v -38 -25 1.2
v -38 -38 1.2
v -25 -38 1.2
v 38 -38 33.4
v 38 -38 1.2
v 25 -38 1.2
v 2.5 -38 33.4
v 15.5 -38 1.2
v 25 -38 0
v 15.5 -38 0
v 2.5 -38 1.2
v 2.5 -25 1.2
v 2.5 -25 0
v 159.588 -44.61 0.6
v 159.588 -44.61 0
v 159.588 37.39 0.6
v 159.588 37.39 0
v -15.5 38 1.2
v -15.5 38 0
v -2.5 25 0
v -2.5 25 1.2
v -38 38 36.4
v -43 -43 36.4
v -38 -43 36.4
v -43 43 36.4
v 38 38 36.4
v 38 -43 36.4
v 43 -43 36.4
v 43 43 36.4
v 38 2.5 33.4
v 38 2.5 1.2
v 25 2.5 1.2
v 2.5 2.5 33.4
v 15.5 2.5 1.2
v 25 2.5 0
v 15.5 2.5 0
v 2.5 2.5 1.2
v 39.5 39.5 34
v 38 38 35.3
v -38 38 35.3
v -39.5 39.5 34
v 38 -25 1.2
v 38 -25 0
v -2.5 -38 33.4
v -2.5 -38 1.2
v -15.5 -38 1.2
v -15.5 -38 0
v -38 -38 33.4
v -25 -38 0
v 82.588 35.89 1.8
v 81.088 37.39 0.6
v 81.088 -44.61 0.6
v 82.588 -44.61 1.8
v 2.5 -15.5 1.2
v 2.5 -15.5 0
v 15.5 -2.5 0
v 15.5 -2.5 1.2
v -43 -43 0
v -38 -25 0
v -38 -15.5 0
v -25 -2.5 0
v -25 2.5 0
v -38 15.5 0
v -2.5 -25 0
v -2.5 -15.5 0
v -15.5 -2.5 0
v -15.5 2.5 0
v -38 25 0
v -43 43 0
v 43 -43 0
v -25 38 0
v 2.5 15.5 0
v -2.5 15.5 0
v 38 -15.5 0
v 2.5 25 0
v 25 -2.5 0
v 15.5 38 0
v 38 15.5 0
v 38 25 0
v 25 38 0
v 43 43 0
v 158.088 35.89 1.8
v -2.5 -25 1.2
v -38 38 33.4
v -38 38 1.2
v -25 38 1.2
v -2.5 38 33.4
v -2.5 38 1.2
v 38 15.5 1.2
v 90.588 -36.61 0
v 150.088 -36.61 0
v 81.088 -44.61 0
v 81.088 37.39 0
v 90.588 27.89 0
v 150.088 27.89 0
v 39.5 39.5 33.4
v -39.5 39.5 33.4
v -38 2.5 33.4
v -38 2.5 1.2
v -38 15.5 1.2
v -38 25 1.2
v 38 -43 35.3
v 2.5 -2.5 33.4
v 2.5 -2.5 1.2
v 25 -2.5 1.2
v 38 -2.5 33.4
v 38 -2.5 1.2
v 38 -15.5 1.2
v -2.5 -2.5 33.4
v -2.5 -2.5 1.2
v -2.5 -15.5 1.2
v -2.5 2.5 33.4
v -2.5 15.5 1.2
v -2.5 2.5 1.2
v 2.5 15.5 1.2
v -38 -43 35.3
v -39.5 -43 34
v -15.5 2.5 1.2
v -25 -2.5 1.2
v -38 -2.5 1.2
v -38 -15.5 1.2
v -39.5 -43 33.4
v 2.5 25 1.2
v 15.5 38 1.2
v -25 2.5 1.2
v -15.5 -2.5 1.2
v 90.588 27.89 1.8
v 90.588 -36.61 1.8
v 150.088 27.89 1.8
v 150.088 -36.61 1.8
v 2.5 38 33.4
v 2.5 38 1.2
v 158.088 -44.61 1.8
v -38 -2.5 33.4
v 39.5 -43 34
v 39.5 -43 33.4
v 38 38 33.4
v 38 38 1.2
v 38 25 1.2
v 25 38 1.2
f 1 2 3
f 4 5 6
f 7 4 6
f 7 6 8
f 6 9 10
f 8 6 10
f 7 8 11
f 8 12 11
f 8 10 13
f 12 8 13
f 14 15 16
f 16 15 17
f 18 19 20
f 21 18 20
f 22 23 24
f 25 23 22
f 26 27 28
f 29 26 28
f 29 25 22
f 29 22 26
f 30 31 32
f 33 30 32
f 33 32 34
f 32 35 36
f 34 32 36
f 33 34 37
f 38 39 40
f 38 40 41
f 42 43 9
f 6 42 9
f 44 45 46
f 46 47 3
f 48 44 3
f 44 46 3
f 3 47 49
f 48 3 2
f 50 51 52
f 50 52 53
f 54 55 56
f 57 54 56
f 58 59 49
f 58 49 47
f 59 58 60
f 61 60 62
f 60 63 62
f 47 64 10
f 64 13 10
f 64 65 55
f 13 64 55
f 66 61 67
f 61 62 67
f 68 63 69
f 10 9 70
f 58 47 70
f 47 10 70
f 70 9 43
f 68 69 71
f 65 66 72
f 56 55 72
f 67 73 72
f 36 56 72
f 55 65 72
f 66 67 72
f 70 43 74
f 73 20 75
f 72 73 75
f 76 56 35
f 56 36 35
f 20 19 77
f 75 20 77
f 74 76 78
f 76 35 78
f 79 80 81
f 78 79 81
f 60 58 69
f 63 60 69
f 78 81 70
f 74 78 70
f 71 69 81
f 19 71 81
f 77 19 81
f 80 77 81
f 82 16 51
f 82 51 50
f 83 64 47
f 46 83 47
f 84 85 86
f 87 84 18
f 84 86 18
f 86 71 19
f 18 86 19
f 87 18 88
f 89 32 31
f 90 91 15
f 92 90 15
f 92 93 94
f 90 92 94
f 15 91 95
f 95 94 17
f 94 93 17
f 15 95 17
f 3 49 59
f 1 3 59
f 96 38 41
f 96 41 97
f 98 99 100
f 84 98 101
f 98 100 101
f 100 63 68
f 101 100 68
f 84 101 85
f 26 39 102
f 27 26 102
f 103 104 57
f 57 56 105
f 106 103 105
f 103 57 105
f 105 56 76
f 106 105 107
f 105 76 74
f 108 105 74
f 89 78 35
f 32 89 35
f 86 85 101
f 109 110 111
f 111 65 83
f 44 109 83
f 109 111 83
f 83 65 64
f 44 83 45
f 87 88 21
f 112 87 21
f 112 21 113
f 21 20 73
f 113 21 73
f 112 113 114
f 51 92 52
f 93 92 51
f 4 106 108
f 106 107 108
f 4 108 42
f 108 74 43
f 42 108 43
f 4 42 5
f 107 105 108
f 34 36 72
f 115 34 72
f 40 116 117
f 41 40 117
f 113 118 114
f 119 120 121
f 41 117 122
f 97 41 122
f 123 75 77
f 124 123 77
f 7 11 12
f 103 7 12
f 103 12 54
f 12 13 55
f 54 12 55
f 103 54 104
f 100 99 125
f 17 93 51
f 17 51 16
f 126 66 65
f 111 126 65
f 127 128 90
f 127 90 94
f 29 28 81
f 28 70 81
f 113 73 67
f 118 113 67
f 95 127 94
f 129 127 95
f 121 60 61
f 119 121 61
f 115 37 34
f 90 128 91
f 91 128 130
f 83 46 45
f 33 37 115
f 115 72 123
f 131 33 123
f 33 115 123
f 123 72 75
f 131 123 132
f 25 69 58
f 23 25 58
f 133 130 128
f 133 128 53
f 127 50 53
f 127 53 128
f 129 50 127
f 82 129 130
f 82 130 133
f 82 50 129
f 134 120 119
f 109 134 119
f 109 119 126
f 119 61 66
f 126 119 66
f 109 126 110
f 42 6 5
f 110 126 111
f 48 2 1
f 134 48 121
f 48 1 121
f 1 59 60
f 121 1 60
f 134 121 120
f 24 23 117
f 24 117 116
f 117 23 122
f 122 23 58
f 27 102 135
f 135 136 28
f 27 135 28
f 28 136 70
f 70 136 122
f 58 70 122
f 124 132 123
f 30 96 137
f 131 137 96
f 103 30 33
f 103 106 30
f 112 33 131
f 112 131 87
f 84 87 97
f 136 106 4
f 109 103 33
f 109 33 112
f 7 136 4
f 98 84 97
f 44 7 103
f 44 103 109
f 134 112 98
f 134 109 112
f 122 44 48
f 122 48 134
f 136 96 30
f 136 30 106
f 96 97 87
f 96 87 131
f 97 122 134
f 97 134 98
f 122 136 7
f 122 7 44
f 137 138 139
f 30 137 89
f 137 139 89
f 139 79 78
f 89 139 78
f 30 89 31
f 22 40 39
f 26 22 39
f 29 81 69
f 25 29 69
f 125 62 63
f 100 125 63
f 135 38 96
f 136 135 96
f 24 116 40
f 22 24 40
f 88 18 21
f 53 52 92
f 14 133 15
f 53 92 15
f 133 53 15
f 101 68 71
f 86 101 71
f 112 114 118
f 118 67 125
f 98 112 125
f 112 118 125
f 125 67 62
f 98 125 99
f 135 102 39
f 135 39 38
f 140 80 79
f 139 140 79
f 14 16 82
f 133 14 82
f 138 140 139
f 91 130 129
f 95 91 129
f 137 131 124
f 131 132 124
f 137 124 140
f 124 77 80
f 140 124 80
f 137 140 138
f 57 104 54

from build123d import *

# Parameters (mm, degrees)
F0_W      = 86
F0_H      = 86
F1_DEPTH  = 1.2
F2_DEPTH  = 33.4
F4_DEPTH  = 3
F0_W_2    = 78.5
F0_H_2    = 82
F9_DEPTH  = 1.8
F13_W     = 59.5
F13_H     = 64.5
F14_DEPTH = 1.801


with BuildPart() as f1:
    # F0 (on Top) → F1 (new body)
    with BuildSketch(Plane.XY):
        Rectangle(F0_W, F0_H)
        Polygon((-2.5, -25), (-2.5, -38), (-15.5, -38), (-25, -38), (-38, -38), (-38, -25), (-38, -15.5), (-38, -2.5), (-25, -2.5), (-15.5, -2.5), (-2.5, -2.5), (-2.5, -15.5), align=None, mode=Mode.SUBTRACT)
        Polygon((2.5, -15.5), (2.5, -2.5), (15.5, -2.5), (25, -2.5), (38, -2.5), (38, -15.5), (38, -25), (38, -38), (25, -38), (15.5, -38), (2.5, -38), (2.5, -25), align=None, mode=Mode.SUBTRACT)
        Polygon((-15.5, 38), (-2.5, 38), (-2.5, 25), (-2.5, 15.5), (-2.5, 2.5), (-15.5, 2.5), (-25, 2.5), (-38, 2.5), (-38, 15.5), (-38, 25), (-38, 38), (-25, 38), align=None, mode=Mode.SUBTRACT)
        Polygon((2.5, 25), (2.5, 38), (15.5, 38), (25, 38), (38, 38), (38, 25), (38, 15.5), (38, 2.5), (25, 2.5), (15.5, 2.5), (2.5, 2.5), (2.5, 15.5), align=None, mode=Mode.SUBTRACT)
        Polygon((-38, 25), (-25, 38), (-38, 38), align=None)
        Polygon((-25, 2.5), (-38, 15.5), (-38, 2.5), align=None)
        Polygon((-2.5, 2.5), (-2.5, 15.5), (-15.5, 2.5), align=None)
        Polygon((-2.5, 25), (-2.5, 38), (-15.5, 38), align=None)
        Polygon((15.5, 38), (2.5, 38), (2.5, 25), align=None)
        Polygon((38, 38), (25, 38), (38, 25), align=None)
        Polygon((38, 2.5), (38, 15.5), (25, 2.5), align=None)
        Polygon((15.5, 2.5), (2.5, 15.5), (2.5, 2.5), align=None)
        Polygon((-38, -2.5), (-38, -15.5), (-25, -2.5), align=None)
        Polygon((-15.5, -2.5), (-2.5, -15.5), (-2.5, -2.5), align=None)
        Polygon((-38, -38), (-25, -38), (-38, -25), align=None)
        Polygon((-15.5, -38), (-2.5, -38), (-2.5, -25), align=None)
        Polygon((15.5, -38), (2.5, -25), (2.5, -38), align=None)
        Polygon((15.5, -2.5), (2.5, -2.5), (2.5, -15.5), align=None)
        Polygon((38, -2.5), (25, -2.5), (38, -15.5), align=None)
        Polygon((38, -38), (38, -25), (25, -38), align=None)
    extrude(amount=F1_DEPTH)

    # F0 (on Top) → F2 (join)
    with BuildSketch(Plane.XY):
        Rectangle(F0_W, F0_H)
        Polygon((-2.5, -25), (-2.5, -38), (-15.5, -38), (-25, -38), (-38, -38), (-38, -25), (-38, -15.5), (-38, -2.5), (-25, -2.5), (-15.5, -2.5), (-2.5, -2.5), (-2.5, -15.5), align=None, mode=Mode.SUBTRACT)
        Polygon((2.5, -15.5), (2.5, -2.5), (15.5, -2.5), (25, -2.5), (38, -2.5), (38, -15.5), (38, -25), (38, -38), (25, -38), (15.5, -38), (2.5, -38), (2.5, -25), align=None, mode=Mode.SUBTRACT)
        Polygon((-15.5, 38), (-2.5, 38), (-2.5, 25), (-2.5, 15.5), (-2.5, 2.5), (-15.5, 2.5), (-25, 2.5), (-38, 2.5), (-38, 15.5), (-38, 25), (-38, 38), (-25, 38), align=None, mode=Mode.SUBTRACT)
        Polygon((2.5, 25), (2.5, 38), (15.5, 38), (25, 38), (38, 38), (38, 25), (38, 15.5), (38, 2.5), (25, 2.5), (15.5, 2.5), (2.5, 2.5), (2.5, 15.5), align=None, mode=Mode.SUBTRACT)
    extrude(amount=F2_DEPTH)

    # F3 (on face) → F4 (join)
    with BuildSketch(Plane.XY.offset(33.4)):
        Polygon((-43, 43), (-43, -43), (-38, -43), (-38, -38), (-38, -2.5), (-38, 2.5), (-38, 38), (-2.5, 38), (2.5, 38), (38, 38), (38, 2.5), (38, -2.5), (38, -38), (38, -43), (43, -43), (43, 43), align=None)
    extrude(amount=F4_DEPTH)

    # F11: sweep along a path in F11_path
    with BuildLine(Plane(origin=(-38, -43, 35.3), x_dir=(0, -1, 0), z_dir=(0, 0, -1))) as f11_path:
        Line((0, 0), (-81, 0))
        Line((-81, 0), (-81, -76))
        Line((-81, -76), (0, -76))
    # F5 (on face) → F11 (sweep, cut)
    with BuildSketch(Plane.XZ.offset(43)):
        Polygon((-39.5, 34), (-39.5, 33.4), (-38, 33.4), (-38, 35.3), align=None)
    sweep(path=f11_path.line, transition=Transition.RIGHT, mode=Mode.SUBTRACT)


with BuildPart() as f9:
    # F0 (on Top) → F9 (new body)
    with BuildSketch(Plane.XY):
        with Locations((120.3376897573, -3.6101650596)):
            Rectangle(F0_W_2, F0_H_2)
    extrude(amount=F9_DEPTH)

    # F12: sweep along a path in F0
    with BuildLine(Plane.XY) as f12_path:
        Line((81.0876897573, -44.6101650596), (81.0876897573, 37.3898349404))
        Line((81.0876897573, 37.3898349404), (159.5876897573, 37.3898349404))
        Line((159.5876897573, 37.3898349404), (159.5876897573, -44.6101650596))
    # F10 (on face) → F12 (sweep, cut)
    with BuildSketch(Plane.XZ.offset(44.6101650596)):
        Polygon((81.0876897573, 1.8), (81.0876897573, 0.6), (82.5876897573, 1.8), align=None)
    sweep(path=f12_path.line, transition=Transition.RIGHT, mode=Mode.SUBTRACT)

    # F13 (on face) → F14 (cut, through all)
    with BuildSketch(Plane.XY.offset(1.8)):
        with Locations((120.3376897573, -4.3601650596)):
            Rectangle(F13_W, F13_H)
    extrude(amount=-F14_DEPTH, mode=Mode.SUBTRACT)


solid = Compound([f1.part, f9.part])
